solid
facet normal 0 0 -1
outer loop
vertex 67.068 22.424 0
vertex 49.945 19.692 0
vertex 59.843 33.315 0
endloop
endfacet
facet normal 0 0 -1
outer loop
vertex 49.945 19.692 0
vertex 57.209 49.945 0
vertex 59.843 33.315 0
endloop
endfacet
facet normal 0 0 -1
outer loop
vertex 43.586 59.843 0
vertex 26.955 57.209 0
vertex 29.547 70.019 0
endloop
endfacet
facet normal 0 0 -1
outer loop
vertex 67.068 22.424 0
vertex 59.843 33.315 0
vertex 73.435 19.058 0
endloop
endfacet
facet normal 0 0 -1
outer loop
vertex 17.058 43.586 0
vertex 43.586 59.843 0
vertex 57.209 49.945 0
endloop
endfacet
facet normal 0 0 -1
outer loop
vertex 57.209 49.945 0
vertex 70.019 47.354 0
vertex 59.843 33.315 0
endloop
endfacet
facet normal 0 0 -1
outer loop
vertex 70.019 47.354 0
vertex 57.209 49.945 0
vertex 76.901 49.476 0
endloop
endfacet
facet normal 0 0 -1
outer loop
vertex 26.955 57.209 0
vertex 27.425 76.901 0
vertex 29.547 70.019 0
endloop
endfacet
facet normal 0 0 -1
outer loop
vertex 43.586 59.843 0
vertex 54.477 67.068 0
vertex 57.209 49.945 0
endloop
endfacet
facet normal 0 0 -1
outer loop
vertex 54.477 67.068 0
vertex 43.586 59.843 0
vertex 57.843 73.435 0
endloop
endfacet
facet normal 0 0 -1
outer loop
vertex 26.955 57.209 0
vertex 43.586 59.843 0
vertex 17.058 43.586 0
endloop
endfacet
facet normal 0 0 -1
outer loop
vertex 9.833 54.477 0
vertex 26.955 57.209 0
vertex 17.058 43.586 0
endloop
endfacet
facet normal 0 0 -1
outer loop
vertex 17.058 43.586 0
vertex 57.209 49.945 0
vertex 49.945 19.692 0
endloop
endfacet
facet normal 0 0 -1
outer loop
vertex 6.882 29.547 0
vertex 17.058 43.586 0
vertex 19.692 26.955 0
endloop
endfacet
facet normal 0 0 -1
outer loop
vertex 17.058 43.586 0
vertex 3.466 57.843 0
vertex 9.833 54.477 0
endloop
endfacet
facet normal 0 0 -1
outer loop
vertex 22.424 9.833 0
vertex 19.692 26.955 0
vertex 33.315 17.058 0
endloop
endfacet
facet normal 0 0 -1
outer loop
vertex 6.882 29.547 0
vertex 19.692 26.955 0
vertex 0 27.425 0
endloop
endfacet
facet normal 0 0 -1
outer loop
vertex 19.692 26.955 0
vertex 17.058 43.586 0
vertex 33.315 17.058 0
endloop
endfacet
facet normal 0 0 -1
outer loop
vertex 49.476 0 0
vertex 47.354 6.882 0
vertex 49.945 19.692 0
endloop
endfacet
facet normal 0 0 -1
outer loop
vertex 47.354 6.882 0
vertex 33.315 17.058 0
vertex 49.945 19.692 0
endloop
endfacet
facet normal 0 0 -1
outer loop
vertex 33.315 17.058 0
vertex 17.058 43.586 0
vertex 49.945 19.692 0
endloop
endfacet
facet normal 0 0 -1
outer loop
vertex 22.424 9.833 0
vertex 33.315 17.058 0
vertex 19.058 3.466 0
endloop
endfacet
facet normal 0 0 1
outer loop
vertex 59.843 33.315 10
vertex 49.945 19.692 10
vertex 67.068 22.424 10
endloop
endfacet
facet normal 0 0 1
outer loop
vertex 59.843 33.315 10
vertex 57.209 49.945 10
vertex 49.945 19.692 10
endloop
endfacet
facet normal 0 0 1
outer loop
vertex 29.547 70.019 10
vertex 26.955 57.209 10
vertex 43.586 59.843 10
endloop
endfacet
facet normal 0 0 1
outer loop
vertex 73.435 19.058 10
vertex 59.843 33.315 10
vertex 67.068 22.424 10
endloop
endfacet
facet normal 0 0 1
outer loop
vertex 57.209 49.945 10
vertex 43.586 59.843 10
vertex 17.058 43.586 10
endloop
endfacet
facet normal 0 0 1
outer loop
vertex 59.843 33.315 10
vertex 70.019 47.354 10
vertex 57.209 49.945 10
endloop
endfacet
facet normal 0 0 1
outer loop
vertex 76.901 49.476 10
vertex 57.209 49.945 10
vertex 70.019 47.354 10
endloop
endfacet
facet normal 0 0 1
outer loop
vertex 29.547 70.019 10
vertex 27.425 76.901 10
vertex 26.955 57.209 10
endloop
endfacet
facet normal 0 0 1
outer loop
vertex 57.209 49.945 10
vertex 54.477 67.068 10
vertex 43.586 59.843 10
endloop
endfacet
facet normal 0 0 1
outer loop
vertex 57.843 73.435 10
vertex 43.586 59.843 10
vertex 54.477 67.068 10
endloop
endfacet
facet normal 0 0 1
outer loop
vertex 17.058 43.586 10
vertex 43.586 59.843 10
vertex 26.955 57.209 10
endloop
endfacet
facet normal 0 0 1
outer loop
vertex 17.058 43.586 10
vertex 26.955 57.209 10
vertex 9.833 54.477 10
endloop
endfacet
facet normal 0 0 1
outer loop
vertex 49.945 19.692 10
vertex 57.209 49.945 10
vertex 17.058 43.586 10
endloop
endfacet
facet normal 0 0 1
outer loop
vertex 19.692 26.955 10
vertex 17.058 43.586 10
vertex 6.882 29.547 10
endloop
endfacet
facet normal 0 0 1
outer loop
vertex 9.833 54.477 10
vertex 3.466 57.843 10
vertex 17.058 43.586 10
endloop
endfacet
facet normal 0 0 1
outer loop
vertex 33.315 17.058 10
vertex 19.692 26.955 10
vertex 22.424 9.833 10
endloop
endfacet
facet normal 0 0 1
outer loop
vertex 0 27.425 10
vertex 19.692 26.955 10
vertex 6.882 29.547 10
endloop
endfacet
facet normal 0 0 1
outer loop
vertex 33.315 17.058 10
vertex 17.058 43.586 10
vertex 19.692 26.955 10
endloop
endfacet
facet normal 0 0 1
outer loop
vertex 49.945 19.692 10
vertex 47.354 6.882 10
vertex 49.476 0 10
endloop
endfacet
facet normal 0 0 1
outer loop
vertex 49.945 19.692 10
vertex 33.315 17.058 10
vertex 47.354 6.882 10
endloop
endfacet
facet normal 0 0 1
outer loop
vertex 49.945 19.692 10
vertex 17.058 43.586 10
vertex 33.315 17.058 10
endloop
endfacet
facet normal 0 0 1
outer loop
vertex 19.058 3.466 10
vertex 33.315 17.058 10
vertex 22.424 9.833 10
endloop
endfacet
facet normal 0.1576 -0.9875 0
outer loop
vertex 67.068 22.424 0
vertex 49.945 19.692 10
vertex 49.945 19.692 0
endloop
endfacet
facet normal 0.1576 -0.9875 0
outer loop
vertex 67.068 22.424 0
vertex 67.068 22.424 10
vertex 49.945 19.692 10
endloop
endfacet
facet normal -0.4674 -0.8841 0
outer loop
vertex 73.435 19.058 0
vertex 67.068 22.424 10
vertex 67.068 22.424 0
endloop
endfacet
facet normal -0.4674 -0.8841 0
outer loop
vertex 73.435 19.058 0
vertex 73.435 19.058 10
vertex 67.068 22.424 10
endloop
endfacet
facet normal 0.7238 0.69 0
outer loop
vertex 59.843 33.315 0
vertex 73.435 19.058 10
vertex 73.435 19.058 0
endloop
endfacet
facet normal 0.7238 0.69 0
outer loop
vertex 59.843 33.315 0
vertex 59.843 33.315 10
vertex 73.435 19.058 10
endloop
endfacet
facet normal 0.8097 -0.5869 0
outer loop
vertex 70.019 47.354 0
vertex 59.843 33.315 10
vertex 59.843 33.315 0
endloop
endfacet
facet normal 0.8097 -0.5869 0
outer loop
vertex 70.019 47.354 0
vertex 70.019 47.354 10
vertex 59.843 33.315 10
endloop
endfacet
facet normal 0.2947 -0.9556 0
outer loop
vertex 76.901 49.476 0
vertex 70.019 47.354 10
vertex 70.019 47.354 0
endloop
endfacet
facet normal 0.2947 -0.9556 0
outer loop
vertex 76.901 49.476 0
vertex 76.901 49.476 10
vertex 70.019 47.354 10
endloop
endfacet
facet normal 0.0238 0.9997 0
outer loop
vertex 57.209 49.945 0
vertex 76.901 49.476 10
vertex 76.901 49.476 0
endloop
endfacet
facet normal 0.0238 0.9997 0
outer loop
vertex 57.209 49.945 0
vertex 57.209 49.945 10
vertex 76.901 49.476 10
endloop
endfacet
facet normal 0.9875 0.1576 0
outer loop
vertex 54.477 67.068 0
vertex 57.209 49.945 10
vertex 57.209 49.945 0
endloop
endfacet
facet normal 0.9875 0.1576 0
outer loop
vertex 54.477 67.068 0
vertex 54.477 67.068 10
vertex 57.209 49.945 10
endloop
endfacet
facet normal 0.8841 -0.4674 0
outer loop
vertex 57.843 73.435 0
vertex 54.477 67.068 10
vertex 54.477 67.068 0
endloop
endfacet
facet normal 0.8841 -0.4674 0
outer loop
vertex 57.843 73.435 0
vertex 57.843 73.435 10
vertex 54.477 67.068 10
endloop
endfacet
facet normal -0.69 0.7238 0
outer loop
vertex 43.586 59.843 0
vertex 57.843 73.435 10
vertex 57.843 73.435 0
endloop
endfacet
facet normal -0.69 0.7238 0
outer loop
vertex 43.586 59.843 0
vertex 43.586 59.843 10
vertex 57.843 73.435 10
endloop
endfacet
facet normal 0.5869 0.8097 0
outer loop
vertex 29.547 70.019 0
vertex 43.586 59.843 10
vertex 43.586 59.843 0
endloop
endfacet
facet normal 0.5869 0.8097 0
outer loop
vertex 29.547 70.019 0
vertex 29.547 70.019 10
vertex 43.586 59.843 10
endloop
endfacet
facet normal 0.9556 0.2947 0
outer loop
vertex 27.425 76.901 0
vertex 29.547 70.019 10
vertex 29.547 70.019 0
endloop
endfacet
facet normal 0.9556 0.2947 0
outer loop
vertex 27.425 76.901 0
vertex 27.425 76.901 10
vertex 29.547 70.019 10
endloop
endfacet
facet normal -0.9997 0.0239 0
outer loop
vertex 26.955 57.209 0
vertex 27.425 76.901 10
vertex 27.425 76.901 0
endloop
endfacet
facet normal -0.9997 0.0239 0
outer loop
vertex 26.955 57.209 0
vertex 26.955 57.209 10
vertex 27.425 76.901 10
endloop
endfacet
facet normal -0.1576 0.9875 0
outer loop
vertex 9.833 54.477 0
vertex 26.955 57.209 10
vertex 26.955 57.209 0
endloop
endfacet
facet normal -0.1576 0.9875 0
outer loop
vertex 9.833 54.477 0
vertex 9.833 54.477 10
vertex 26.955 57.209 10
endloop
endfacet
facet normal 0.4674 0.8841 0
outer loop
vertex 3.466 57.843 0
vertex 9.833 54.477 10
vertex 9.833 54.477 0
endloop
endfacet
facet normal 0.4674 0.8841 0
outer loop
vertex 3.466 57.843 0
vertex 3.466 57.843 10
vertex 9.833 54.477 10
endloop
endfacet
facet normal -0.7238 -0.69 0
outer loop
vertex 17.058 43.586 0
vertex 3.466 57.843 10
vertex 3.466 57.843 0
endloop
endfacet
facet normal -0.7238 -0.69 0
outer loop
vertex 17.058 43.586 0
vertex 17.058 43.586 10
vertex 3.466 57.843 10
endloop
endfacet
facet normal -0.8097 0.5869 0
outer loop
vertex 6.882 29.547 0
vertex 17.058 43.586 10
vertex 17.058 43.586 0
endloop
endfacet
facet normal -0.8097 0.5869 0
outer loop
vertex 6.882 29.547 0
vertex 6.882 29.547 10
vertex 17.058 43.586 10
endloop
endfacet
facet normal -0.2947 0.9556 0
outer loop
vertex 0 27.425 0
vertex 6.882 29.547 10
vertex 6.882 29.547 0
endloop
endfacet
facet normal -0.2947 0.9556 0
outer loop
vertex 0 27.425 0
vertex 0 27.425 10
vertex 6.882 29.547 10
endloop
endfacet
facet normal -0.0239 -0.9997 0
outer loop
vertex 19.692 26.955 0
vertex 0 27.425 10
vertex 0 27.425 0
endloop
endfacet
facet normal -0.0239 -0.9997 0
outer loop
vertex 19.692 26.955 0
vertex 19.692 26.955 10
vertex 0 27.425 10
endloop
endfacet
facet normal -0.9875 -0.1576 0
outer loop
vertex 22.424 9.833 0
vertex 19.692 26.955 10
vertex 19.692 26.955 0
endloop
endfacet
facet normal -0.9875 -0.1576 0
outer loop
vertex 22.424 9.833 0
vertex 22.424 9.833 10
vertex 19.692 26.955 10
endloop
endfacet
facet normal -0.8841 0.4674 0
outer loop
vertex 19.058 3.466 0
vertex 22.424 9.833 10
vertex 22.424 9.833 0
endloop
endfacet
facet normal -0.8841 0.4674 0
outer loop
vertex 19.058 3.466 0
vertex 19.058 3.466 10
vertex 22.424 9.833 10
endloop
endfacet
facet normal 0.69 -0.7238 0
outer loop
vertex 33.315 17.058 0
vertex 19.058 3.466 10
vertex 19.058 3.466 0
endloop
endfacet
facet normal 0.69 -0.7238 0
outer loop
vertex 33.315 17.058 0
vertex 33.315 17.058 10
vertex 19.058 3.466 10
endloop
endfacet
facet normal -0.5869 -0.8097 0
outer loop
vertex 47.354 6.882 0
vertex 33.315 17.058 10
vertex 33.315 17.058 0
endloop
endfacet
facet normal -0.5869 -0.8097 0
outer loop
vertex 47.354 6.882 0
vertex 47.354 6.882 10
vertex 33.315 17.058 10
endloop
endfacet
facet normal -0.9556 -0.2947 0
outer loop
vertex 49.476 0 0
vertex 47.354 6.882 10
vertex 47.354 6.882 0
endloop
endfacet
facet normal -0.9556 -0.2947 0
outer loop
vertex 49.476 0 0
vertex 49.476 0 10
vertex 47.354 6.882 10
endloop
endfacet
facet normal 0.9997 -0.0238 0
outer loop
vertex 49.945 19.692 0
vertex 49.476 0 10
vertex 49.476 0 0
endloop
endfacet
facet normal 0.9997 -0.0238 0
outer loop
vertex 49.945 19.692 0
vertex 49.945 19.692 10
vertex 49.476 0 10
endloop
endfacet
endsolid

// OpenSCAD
$fn = 32;

// ----------------------------------------------------------------------
// Fan rotor section: 8 blades, 22 mm hub radius, 18 mm blades
// ----------------------------------------------------------------------

// --- parameters (mm) ---
profile_height = 10;      // extrusion height
profile_points = 24;      // points of the closed outline

profile = [[59.843, 33.315], [70.019, 47.354], [76.901, 49.476], [57.209, 49.945], [54.477, 67.068], [57.843, 73.435], [43.586, 59.843], [29.547, 70.019], [27.425, 76.901], [26.955, 57.209], [9.833, 54.477], [3.466, 57.843], [17.058, 43.586], [6.882, 29.547], [0, 27.425], [19.692, 26.955], [22.424, 9.833], [19.058, 3.466], [33.315, 17.058], [47.354, 6.882], [49.476, 0], [49.945, 19.692], [67.068, 22.424], [73.435, 19.058]];  // single closed polygon, 24 points, counter clockwise

// --- the one profile operation ---
linear_extrude(height = profile_height) polygon(points = profile);
